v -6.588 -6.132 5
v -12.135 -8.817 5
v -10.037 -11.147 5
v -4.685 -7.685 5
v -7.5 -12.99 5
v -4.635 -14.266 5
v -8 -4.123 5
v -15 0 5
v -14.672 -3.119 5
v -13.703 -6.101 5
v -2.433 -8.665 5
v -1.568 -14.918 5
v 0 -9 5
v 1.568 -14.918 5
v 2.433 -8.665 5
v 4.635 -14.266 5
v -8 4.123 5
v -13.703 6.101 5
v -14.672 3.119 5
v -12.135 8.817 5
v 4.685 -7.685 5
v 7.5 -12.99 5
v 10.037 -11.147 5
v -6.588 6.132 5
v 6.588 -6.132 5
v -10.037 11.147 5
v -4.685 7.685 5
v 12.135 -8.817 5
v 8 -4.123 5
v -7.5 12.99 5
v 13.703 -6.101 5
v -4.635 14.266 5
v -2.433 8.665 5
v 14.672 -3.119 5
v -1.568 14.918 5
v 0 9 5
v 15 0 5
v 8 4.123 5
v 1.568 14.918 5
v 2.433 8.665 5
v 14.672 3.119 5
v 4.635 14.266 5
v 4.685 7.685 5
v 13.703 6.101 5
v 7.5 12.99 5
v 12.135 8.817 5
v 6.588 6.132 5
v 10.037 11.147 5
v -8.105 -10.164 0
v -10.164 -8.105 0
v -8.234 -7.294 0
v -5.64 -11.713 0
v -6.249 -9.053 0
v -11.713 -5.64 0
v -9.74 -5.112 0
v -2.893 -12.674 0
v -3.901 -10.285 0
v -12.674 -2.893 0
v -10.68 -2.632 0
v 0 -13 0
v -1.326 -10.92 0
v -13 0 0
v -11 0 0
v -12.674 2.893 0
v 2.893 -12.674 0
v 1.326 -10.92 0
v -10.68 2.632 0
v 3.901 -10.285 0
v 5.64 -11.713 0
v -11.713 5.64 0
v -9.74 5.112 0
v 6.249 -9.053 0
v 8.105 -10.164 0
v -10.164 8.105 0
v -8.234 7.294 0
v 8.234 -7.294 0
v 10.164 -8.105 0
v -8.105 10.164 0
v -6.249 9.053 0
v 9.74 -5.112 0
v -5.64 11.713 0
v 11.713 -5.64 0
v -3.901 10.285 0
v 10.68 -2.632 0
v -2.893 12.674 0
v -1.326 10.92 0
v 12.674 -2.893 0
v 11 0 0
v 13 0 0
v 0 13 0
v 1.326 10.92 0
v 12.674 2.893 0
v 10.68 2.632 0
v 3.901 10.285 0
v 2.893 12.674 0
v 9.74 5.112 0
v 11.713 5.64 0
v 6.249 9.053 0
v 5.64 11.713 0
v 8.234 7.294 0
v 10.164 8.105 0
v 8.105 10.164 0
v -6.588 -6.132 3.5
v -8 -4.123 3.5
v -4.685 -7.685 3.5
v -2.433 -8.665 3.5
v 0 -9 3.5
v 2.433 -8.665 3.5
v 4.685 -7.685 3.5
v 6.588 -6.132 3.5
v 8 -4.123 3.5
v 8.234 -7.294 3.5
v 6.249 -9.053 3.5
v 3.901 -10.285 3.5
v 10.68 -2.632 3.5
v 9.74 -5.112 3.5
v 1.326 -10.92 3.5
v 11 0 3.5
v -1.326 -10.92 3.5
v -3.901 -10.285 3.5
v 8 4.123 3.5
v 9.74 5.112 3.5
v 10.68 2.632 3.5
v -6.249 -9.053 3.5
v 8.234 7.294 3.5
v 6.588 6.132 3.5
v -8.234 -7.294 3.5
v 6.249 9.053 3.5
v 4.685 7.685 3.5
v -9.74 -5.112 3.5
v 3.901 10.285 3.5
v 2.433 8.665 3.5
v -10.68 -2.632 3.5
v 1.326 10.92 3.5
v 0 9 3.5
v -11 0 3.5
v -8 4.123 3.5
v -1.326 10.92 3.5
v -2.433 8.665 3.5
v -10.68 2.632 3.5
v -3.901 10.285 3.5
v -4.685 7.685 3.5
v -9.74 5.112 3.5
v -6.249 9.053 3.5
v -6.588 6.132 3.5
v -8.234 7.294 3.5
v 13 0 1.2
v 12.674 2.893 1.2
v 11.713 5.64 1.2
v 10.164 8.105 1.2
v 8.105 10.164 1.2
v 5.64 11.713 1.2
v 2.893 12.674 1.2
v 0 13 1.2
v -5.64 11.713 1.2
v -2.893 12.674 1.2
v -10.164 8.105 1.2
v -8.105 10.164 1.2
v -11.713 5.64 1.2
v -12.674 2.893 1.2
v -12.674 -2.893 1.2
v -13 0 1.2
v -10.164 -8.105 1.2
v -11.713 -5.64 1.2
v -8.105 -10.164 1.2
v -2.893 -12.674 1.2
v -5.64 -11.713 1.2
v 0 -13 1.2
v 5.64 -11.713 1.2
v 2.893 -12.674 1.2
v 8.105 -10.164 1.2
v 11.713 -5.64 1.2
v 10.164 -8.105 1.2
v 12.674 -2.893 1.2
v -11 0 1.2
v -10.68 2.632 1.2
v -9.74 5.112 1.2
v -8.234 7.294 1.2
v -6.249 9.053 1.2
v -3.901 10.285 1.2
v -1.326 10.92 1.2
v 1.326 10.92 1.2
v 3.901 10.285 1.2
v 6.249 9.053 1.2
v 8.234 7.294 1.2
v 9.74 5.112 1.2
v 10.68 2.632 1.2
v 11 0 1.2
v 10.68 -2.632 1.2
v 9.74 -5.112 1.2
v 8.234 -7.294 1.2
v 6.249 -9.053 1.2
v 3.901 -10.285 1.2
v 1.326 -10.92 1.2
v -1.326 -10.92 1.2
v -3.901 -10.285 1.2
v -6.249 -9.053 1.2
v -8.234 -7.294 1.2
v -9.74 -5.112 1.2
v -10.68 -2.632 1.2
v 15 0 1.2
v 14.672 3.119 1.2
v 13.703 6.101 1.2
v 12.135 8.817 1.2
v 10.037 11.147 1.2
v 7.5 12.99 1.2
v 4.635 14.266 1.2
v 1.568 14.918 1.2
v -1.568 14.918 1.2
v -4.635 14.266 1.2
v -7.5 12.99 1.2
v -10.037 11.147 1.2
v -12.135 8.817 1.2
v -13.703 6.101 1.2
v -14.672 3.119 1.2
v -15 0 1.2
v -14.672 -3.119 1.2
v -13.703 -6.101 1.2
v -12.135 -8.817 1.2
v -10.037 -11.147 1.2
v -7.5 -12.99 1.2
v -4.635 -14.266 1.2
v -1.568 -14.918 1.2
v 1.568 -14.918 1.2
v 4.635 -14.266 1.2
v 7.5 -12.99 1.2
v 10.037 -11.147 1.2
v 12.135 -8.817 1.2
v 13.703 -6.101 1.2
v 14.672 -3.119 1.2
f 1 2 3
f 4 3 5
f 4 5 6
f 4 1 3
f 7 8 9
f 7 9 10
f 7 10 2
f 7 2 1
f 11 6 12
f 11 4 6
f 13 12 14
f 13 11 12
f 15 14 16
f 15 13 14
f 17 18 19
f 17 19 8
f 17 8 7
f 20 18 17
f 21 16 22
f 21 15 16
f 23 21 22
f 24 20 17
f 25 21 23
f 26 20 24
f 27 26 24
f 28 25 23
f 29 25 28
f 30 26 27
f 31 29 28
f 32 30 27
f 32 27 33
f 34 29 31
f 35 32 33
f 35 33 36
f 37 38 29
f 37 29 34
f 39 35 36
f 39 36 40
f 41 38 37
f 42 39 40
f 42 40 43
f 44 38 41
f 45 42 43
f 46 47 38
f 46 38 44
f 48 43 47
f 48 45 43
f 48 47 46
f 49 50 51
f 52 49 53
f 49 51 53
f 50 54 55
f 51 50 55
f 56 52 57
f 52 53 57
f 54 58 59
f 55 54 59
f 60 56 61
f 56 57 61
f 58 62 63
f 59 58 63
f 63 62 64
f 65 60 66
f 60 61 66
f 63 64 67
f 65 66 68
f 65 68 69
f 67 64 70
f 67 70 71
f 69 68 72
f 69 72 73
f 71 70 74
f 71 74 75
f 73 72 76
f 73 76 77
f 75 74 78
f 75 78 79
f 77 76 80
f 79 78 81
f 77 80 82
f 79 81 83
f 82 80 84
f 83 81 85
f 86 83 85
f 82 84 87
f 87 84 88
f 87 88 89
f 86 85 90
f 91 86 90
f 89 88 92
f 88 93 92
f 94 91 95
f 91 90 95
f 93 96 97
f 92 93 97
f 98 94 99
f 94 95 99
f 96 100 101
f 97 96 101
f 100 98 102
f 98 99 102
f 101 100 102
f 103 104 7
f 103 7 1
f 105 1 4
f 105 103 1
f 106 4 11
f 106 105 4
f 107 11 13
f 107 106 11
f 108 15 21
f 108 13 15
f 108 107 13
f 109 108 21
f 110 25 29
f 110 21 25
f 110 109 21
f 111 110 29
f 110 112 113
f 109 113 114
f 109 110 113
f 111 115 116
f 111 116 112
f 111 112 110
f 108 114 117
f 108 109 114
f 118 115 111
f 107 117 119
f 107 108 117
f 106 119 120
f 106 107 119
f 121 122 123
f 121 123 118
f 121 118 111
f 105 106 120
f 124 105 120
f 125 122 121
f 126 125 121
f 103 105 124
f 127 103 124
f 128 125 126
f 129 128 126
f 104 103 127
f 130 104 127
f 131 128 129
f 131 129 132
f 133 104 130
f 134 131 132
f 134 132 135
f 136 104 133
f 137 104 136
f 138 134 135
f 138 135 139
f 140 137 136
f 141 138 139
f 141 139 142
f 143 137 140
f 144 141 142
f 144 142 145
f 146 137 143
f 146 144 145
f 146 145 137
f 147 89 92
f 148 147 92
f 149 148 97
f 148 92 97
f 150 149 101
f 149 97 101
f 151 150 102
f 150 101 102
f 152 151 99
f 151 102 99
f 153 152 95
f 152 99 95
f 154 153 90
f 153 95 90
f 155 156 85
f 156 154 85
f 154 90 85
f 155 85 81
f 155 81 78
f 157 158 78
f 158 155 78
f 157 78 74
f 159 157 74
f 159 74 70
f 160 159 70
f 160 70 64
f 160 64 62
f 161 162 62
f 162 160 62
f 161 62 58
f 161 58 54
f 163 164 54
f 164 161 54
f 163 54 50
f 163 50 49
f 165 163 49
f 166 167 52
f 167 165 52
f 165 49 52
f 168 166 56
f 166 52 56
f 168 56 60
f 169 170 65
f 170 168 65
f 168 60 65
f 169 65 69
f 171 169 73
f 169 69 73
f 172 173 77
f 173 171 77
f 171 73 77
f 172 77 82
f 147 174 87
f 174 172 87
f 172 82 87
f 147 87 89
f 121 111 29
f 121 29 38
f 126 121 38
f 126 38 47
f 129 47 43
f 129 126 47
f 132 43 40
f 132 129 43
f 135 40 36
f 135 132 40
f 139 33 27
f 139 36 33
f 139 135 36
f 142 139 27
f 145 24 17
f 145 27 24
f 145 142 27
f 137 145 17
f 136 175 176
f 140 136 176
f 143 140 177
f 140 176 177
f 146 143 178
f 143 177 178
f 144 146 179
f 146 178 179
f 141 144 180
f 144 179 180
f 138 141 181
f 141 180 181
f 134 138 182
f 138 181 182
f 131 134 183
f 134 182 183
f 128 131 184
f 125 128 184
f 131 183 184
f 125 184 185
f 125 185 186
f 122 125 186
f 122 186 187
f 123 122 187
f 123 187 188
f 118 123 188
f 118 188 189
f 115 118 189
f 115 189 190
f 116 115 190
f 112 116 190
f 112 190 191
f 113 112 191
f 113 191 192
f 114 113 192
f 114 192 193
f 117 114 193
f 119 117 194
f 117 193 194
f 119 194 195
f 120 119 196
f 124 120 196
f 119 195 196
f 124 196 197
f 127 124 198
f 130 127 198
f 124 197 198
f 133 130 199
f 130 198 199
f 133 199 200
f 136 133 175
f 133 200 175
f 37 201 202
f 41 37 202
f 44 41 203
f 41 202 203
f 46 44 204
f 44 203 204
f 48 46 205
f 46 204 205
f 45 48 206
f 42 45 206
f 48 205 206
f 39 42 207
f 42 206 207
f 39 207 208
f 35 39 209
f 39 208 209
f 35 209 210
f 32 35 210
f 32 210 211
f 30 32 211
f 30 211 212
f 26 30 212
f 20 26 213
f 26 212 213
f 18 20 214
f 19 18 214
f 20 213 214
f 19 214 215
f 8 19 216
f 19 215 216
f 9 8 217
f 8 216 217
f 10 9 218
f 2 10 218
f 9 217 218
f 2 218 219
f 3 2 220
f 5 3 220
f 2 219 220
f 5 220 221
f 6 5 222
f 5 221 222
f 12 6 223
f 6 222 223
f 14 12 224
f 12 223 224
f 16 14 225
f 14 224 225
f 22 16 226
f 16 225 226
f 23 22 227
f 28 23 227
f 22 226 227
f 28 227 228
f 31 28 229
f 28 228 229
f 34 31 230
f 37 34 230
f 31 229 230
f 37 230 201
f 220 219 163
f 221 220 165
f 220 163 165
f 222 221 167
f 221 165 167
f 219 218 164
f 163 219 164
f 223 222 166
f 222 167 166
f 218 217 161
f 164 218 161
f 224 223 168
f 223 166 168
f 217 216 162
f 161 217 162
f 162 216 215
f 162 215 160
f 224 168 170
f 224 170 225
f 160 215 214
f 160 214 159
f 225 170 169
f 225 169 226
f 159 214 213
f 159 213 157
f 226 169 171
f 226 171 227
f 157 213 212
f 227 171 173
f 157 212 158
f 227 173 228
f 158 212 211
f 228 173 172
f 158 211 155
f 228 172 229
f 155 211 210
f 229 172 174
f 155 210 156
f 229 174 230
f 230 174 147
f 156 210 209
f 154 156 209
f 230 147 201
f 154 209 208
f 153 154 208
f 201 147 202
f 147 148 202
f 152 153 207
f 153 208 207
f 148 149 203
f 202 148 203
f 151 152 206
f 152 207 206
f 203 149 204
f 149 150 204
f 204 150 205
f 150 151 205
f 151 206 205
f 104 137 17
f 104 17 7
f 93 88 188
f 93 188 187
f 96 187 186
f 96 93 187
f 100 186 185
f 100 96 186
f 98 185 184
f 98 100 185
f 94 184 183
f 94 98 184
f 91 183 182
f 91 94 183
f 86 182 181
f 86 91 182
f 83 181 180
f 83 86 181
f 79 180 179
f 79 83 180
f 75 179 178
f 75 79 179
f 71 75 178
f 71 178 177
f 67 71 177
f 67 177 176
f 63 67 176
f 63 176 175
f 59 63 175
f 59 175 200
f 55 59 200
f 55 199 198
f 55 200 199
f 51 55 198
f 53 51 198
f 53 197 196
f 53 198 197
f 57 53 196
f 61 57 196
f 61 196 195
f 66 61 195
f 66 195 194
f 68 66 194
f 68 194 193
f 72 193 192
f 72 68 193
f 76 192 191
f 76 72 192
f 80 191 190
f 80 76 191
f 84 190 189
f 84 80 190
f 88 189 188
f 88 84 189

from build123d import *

# Parameters (mm, degrees)
SKETCH_1_R           = 13
SKETCH_1_R_2         = 11
EXTRUDE_1_DEPTH      = 4
EXTRUDE_2_DEPTH      = 1
EXTRUDE_2_DEPTH_BACK = 2.8
SKETCH_2_R           = 15
SKETCH_3_R           = 11
CUT_EXTRUDE_1_DEPTH  = 2.3
CUT_EXTRUDE_2_DEPTH  = 2


with BuildPart() as part:
    # 草图1 → 拉伸1 (new body)
    with BuildSketch(Plane.XY):
        Circle(SKETCH_1_R)
        Circle(SKETCH_1_R_2, mode=Mode.SUBTRACT)
    extrude(amount=EXTRUDE_1_DEPTH)

    # 草图2 → 拉伸2 (add, two sides: drawn at the far end of the back side and taken through both)
    with BuildSketch(Plane.XY.offset(4).offset(-EXTRUDE_2_DEPTH_BACK)):
        Circle(SKETCH_2_R)
    extrude(amount=EXTRUDE_2_DEPTH + EXTRUDE_2_DEPTH_BACK)

    # 草图3 → 切除-拉伸1 (cut)
    with BuildSketch(Plane(origin=(0, 0, 1.2), x_dir=(-1, 0, 0), z_dir=(0, 0, -1))):
        Circle(SKETCH_3_R)
    extrude(amount=-CUT_EXTRUDE_1_DEPTH, mode=Mode.SUBTRACT)

    # 草图4 → 切除-拉伸2 (cut)
    with BuildSketch(Plane(origin=(0, 0, 3.5), x_dir=(-1, 0, 0), z_dir=(0, 0, -1))):
        with BuildLine():
            Line((-8, -4.123105626), (-8, 4.123105626))
            ThreePointArc((-8, 4.123105626), (0, 9), (8, 4.123105626))
            Line((8, 4.123105626), (8, -4.123105626))
            ThreePointArc((8, -4.123105626), (0, -9), (-8, -4.123105626))
        make_face()
    extrude(amount=-CUT_EXTRUDE_2_DEPTH, mode=Mode.SUBTRACT)


solid = part.part
